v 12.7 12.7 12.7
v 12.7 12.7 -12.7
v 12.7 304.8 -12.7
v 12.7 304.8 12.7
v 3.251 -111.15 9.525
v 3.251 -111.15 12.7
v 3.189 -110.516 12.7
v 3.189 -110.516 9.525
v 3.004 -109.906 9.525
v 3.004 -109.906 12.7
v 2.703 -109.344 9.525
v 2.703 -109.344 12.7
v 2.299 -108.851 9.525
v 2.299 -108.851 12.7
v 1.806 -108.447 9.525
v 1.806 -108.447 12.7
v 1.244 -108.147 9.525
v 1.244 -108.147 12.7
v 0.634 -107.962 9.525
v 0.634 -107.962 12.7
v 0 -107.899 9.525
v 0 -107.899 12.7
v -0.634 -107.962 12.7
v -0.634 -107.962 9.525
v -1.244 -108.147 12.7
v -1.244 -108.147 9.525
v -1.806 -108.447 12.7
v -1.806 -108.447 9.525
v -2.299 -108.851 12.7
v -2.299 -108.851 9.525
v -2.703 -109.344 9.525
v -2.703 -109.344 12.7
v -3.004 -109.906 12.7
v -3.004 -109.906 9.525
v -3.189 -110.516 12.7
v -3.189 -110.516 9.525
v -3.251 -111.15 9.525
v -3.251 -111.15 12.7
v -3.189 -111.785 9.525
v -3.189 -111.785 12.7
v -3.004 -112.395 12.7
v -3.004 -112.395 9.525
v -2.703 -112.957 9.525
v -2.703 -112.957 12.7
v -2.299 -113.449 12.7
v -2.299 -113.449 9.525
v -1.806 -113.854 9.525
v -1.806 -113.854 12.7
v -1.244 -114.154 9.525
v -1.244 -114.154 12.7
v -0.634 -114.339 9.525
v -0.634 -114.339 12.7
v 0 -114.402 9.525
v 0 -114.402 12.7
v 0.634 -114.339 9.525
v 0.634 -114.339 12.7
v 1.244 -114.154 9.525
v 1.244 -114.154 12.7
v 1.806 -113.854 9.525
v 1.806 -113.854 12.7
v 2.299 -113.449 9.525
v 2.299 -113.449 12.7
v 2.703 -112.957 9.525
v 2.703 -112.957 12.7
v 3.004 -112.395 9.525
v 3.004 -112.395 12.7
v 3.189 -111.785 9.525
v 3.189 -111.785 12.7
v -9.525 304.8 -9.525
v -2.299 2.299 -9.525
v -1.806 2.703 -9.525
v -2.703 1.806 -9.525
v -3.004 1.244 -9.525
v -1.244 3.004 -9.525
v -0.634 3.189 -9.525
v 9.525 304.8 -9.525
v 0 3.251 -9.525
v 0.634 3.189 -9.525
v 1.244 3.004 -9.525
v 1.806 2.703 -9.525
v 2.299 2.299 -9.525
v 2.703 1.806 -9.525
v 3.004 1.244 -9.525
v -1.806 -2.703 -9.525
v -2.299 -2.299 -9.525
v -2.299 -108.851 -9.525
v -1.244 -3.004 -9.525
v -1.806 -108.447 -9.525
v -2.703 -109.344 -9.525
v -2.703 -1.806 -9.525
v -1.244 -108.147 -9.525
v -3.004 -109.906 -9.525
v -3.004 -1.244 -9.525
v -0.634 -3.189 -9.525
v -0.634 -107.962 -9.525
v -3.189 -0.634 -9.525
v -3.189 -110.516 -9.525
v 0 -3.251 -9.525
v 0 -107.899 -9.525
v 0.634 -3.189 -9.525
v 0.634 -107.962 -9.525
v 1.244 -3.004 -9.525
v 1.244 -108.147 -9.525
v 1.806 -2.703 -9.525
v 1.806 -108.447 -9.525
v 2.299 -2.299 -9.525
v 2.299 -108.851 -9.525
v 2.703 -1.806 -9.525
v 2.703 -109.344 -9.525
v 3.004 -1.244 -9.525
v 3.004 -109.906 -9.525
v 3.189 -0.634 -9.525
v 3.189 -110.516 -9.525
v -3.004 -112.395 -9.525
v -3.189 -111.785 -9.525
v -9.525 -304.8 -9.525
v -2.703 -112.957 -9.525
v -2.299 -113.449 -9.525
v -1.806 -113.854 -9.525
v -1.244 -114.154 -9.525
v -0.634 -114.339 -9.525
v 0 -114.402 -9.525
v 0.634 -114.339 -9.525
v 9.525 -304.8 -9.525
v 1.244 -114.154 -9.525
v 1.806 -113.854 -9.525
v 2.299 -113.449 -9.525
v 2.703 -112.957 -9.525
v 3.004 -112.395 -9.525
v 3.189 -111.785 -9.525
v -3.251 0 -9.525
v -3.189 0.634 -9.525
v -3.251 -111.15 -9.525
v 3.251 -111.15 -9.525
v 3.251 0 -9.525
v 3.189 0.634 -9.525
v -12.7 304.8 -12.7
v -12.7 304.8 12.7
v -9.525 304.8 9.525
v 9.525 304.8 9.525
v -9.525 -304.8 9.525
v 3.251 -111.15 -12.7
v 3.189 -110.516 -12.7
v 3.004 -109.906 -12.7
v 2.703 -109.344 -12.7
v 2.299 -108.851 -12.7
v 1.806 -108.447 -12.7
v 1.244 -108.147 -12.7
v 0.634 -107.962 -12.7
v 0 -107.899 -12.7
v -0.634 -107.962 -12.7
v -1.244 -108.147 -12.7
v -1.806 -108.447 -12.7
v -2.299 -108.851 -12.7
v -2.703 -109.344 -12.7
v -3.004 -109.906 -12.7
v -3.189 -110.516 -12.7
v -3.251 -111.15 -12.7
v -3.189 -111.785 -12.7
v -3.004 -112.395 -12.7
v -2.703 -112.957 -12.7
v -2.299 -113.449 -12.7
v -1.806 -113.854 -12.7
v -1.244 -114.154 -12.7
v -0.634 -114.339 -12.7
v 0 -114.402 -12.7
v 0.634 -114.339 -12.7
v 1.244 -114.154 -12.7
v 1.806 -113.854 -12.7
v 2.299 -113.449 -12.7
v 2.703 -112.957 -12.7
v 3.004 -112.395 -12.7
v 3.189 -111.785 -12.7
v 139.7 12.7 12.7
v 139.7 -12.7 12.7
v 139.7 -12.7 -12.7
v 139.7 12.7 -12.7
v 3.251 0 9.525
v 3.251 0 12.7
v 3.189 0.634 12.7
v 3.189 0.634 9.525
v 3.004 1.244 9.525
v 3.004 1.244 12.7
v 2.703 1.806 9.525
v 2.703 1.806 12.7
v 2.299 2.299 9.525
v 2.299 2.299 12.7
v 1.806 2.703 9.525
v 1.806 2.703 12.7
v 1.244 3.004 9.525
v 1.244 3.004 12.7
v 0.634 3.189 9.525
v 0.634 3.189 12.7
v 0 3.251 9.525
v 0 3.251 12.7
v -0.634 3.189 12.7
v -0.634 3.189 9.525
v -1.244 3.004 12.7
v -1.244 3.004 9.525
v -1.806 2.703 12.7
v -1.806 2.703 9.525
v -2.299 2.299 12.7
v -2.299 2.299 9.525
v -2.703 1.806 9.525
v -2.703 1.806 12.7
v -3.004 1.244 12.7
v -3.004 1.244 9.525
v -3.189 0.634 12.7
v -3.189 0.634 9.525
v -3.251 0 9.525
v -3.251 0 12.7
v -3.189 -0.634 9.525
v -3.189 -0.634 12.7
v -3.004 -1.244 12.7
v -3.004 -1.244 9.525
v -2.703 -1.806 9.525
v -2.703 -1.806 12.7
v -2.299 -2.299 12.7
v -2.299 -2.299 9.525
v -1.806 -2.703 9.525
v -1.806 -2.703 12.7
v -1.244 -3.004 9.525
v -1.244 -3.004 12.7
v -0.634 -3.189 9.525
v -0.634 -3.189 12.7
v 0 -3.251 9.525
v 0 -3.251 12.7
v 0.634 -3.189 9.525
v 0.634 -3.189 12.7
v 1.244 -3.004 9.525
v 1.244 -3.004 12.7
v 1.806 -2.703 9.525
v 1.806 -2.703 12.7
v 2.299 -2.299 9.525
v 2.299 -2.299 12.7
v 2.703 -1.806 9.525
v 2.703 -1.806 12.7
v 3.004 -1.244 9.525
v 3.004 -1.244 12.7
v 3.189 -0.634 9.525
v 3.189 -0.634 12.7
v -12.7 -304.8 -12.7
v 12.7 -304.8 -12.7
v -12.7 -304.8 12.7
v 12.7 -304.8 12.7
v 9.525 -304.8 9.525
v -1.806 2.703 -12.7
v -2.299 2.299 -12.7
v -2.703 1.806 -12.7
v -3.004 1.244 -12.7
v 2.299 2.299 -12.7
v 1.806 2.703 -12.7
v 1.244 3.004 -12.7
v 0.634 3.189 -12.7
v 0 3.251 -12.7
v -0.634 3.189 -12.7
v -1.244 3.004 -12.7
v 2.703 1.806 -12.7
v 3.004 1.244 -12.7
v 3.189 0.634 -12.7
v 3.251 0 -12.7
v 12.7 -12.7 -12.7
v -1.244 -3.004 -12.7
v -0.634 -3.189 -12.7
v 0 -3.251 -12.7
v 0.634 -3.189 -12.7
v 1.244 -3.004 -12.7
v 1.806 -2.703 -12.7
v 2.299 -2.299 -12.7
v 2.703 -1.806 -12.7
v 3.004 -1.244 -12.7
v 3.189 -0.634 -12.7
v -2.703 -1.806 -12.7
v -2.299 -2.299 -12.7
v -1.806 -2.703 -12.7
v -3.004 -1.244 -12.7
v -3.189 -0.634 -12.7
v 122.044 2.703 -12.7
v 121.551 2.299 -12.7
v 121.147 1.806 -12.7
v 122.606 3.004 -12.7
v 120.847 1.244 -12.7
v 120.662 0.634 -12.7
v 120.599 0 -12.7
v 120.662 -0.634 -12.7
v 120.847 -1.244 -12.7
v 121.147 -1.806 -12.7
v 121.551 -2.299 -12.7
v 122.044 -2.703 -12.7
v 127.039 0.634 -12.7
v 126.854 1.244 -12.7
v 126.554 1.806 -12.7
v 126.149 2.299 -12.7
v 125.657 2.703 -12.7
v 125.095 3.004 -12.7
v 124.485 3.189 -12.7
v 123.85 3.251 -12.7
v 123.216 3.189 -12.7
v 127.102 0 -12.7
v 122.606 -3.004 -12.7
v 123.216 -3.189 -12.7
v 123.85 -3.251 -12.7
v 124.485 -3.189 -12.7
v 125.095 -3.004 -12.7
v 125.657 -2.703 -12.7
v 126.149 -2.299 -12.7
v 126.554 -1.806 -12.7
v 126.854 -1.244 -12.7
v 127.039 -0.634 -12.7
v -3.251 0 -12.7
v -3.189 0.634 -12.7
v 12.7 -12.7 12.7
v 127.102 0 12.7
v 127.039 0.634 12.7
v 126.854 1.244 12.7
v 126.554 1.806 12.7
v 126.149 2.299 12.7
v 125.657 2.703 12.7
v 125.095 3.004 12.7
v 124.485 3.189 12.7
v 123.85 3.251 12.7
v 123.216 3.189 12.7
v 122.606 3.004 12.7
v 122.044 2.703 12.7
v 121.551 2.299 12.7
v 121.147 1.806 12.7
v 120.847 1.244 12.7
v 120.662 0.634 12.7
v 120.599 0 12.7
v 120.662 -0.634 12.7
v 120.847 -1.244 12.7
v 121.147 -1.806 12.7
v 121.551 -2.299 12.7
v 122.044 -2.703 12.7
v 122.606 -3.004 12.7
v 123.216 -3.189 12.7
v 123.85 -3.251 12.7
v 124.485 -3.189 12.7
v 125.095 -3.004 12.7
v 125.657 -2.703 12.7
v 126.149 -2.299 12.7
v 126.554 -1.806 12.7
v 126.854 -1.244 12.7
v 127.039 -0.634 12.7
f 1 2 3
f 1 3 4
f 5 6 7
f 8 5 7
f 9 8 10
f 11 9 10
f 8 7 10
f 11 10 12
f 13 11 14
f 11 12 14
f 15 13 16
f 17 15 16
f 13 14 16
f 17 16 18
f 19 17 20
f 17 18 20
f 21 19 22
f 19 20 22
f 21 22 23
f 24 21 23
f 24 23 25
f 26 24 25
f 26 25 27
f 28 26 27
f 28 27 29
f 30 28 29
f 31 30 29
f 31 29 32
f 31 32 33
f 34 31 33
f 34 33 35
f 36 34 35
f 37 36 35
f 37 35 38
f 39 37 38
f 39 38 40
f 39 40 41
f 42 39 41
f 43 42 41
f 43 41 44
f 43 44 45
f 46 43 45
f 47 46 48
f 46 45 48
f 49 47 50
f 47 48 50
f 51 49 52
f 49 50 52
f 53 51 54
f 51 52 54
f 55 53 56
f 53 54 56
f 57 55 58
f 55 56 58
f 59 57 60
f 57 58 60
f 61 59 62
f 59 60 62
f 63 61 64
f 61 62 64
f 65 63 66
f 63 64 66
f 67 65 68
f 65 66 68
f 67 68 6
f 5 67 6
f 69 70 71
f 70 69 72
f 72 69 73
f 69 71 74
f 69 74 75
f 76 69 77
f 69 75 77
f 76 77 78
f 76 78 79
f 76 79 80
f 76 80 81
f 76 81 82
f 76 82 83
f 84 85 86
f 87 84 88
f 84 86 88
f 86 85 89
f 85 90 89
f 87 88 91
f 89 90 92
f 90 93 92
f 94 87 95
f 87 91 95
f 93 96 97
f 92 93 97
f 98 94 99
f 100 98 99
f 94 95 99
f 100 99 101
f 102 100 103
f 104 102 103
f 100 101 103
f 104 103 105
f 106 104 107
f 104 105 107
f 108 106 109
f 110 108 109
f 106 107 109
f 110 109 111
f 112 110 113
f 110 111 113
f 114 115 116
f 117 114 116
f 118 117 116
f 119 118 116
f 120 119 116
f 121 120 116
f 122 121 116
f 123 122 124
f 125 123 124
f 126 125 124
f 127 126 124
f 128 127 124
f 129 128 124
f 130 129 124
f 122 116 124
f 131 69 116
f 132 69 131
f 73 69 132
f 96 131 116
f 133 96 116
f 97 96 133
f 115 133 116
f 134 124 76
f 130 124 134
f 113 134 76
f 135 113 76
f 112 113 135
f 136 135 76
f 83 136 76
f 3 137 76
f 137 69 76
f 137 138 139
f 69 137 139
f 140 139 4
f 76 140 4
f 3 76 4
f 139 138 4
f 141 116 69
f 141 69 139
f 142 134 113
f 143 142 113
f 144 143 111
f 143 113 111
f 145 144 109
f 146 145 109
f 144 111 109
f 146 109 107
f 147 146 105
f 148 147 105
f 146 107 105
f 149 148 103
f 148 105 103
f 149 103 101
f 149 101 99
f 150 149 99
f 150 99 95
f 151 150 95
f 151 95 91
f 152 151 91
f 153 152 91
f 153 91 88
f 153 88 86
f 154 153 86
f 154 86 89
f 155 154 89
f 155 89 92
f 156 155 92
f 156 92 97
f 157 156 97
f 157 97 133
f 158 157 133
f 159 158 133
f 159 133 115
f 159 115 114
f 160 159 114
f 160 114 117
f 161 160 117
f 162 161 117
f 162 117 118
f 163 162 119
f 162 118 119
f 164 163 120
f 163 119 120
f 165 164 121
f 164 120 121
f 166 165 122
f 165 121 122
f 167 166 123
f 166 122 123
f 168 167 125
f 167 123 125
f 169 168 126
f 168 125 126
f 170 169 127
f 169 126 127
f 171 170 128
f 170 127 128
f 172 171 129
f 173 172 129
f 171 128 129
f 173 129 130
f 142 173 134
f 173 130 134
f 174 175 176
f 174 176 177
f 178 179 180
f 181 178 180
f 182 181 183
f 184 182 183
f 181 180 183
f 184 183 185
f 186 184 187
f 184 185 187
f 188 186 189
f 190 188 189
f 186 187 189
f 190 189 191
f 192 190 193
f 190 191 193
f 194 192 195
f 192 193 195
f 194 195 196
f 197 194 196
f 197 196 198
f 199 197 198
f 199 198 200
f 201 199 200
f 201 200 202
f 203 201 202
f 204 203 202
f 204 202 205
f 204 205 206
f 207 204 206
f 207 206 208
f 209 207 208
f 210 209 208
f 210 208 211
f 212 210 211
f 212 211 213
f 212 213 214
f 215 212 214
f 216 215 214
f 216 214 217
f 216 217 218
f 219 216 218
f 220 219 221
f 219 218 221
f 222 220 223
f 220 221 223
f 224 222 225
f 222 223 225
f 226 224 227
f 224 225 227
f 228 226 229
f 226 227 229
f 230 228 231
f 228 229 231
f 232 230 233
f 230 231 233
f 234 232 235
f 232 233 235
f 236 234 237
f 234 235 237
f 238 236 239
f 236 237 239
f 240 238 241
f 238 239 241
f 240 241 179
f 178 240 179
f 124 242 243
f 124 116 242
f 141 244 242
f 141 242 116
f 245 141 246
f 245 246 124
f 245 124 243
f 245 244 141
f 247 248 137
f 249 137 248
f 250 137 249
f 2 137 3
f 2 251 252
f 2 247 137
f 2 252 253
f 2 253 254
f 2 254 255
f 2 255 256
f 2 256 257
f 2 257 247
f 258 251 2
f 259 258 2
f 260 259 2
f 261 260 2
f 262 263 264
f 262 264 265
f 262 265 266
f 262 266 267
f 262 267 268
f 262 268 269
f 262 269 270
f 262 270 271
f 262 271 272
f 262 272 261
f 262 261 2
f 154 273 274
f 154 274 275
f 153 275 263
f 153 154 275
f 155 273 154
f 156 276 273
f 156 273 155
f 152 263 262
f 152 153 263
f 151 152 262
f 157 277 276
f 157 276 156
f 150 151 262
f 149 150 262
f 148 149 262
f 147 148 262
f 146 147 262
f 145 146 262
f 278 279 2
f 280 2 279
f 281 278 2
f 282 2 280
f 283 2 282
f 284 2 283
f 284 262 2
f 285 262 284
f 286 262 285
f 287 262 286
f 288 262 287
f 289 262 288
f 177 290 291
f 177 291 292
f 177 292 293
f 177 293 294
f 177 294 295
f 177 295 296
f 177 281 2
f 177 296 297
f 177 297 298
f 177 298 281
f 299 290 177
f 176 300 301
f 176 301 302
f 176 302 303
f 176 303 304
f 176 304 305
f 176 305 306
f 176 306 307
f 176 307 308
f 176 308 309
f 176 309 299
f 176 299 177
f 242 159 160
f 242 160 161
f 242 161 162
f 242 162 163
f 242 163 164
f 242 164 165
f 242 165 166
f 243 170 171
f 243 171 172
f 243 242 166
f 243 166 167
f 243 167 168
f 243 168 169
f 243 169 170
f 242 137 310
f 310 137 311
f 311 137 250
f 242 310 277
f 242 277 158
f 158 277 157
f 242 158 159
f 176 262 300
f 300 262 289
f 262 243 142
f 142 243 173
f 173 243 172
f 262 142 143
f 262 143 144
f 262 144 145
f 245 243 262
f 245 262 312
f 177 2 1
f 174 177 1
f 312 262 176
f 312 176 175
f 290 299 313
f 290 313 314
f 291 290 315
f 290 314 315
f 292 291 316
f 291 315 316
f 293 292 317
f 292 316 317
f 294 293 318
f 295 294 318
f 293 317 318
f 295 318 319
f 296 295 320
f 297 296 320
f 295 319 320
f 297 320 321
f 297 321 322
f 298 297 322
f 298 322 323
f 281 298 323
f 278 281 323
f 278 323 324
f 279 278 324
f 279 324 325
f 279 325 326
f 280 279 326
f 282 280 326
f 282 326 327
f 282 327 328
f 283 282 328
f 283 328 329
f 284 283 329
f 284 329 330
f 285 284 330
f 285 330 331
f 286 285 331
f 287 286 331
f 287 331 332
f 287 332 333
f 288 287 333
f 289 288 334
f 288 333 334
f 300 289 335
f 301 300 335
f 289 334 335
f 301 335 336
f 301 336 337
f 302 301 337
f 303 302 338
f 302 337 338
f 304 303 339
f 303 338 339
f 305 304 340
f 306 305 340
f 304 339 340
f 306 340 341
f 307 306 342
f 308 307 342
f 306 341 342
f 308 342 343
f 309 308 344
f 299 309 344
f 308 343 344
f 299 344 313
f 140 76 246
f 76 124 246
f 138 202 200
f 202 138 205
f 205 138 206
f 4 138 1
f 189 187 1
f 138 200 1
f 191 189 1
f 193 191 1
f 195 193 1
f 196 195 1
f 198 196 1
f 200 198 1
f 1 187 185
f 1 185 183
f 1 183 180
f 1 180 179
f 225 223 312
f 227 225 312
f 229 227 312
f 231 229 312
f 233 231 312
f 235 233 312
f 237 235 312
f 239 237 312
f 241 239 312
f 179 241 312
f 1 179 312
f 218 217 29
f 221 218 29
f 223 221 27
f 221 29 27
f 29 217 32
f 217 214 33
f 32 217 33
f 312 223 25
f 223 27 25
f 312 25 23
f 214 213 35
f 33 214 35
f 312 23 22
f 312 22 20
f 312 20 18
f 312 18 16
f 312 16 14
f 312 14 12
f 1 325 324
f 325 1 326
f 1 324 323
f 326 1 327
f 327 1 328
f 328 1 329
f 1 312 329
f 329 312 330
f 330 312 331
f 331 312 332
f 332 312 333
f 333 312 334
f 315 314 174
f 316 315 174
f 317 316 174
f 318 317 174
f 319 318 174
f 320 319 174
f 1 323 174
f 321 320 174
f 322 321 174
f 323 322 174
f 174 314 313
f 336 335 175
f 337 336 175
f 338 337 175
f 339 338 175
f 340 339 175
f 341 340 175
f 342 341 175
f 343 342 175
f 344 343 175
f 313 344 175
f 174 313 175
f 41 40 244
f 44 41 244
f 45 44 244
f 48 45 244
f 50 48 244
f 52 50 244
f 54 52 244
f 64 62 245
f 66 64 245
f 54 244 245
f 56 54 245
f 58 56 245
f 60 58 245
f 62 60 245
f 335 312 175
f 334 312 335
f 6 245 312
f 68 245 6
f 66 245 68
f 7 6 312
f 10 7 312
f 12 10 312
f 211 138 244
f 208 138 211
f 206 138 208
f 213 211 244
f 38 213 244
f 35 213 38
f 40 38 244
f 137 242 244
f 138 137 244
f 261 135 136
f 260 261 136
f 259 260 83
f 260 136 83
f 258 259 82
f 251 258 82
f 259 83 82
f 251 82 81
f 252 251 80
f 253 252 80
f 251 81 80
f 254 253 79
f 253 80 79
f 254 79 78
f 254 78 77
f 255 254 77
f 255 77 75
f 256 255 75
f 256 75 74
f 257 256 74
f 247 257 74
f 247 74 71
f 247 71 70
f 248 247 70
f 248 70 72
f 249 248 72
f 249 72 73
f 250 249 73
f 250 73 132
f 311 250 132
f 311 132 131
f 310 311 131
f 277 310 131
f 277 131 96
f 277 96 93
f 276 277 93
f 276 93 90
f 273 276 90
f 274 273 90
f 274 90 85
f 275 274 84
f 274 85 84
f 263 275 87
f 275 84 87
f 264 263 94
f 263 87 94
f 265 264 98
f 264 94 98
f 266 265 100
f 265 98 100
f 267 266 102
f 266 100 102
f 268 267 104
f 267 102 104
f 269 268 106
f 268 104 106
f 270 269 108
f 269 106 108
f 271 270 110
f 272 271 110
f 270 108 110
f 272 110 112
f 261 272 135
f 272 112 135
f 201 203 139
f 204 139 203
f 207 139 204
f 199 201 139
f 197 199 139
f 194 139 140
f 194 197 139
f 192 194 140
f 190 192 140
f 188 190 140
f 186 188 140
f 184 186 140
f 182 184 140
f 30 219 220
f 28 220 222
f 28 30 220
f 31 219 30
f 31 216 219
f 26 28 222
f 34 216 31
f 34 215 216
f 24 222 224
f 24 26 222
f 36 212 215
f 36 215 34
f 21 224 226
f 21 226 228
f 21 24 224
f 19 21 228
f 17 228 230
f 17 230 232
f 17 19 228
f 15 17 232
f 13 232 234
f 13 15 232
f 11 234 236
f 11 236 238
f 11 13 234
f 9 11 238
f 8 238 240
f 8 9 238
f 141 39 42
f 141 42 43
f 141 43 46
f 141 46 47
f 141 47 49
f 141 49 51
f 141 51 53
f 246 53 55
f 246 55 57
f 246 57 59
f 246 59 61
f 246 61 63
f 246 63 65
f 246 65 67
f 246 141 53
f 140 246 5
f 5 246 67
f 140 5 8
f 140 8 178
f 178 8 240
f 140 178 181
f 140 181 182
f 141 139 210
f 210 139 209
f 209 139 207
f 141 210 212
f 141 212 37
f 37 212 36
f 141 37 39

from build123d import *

# Parameters (mm, degrees)
F0_W     = 25.4
F0_H     = 25.4
F0_W_2   = 19.05
F0_H_2   = 19.05
F1_DEPTH = 304.8
F2_W     = 25.4
F2_H     = 25.4
F3_DEPTH = 127
F4_R     = 3.2512
F5_DEPTH = 25.401


with BuildPart() as f1:
    # F0 (on Front) → F1 (new body, symmetric)
    with BuildSketch(Plane.XZ):
        Rectangle(F0_W, F0_H)
        Rectangle(F0_W_2, F0_H_2, mode=Mode.SUBTRACT)
    extrude(amount=F1_DEPTH, both=True)

    # F2 (on face) → F3 (join)
    with BuildSketch(Plane.YZ.offset(12.7)):
        Rectangle(F2_W, F2_H)
    extrude(amount=F3_DEPTH)

    # F4 (on face) → F5 (cut, through all)
    with BuildSketch(Plane.XY.offset(12.7)):
        Circle(F4_R)
        with Locations((123.8504, 0)):
            Circle(F4_R)
        with Locations((0, -111.1504)):
            Circle(F4_R)
    extrude(amount=-F5_DEPTH, mode=Mode.SUBTRACT)


solid = f1.part
